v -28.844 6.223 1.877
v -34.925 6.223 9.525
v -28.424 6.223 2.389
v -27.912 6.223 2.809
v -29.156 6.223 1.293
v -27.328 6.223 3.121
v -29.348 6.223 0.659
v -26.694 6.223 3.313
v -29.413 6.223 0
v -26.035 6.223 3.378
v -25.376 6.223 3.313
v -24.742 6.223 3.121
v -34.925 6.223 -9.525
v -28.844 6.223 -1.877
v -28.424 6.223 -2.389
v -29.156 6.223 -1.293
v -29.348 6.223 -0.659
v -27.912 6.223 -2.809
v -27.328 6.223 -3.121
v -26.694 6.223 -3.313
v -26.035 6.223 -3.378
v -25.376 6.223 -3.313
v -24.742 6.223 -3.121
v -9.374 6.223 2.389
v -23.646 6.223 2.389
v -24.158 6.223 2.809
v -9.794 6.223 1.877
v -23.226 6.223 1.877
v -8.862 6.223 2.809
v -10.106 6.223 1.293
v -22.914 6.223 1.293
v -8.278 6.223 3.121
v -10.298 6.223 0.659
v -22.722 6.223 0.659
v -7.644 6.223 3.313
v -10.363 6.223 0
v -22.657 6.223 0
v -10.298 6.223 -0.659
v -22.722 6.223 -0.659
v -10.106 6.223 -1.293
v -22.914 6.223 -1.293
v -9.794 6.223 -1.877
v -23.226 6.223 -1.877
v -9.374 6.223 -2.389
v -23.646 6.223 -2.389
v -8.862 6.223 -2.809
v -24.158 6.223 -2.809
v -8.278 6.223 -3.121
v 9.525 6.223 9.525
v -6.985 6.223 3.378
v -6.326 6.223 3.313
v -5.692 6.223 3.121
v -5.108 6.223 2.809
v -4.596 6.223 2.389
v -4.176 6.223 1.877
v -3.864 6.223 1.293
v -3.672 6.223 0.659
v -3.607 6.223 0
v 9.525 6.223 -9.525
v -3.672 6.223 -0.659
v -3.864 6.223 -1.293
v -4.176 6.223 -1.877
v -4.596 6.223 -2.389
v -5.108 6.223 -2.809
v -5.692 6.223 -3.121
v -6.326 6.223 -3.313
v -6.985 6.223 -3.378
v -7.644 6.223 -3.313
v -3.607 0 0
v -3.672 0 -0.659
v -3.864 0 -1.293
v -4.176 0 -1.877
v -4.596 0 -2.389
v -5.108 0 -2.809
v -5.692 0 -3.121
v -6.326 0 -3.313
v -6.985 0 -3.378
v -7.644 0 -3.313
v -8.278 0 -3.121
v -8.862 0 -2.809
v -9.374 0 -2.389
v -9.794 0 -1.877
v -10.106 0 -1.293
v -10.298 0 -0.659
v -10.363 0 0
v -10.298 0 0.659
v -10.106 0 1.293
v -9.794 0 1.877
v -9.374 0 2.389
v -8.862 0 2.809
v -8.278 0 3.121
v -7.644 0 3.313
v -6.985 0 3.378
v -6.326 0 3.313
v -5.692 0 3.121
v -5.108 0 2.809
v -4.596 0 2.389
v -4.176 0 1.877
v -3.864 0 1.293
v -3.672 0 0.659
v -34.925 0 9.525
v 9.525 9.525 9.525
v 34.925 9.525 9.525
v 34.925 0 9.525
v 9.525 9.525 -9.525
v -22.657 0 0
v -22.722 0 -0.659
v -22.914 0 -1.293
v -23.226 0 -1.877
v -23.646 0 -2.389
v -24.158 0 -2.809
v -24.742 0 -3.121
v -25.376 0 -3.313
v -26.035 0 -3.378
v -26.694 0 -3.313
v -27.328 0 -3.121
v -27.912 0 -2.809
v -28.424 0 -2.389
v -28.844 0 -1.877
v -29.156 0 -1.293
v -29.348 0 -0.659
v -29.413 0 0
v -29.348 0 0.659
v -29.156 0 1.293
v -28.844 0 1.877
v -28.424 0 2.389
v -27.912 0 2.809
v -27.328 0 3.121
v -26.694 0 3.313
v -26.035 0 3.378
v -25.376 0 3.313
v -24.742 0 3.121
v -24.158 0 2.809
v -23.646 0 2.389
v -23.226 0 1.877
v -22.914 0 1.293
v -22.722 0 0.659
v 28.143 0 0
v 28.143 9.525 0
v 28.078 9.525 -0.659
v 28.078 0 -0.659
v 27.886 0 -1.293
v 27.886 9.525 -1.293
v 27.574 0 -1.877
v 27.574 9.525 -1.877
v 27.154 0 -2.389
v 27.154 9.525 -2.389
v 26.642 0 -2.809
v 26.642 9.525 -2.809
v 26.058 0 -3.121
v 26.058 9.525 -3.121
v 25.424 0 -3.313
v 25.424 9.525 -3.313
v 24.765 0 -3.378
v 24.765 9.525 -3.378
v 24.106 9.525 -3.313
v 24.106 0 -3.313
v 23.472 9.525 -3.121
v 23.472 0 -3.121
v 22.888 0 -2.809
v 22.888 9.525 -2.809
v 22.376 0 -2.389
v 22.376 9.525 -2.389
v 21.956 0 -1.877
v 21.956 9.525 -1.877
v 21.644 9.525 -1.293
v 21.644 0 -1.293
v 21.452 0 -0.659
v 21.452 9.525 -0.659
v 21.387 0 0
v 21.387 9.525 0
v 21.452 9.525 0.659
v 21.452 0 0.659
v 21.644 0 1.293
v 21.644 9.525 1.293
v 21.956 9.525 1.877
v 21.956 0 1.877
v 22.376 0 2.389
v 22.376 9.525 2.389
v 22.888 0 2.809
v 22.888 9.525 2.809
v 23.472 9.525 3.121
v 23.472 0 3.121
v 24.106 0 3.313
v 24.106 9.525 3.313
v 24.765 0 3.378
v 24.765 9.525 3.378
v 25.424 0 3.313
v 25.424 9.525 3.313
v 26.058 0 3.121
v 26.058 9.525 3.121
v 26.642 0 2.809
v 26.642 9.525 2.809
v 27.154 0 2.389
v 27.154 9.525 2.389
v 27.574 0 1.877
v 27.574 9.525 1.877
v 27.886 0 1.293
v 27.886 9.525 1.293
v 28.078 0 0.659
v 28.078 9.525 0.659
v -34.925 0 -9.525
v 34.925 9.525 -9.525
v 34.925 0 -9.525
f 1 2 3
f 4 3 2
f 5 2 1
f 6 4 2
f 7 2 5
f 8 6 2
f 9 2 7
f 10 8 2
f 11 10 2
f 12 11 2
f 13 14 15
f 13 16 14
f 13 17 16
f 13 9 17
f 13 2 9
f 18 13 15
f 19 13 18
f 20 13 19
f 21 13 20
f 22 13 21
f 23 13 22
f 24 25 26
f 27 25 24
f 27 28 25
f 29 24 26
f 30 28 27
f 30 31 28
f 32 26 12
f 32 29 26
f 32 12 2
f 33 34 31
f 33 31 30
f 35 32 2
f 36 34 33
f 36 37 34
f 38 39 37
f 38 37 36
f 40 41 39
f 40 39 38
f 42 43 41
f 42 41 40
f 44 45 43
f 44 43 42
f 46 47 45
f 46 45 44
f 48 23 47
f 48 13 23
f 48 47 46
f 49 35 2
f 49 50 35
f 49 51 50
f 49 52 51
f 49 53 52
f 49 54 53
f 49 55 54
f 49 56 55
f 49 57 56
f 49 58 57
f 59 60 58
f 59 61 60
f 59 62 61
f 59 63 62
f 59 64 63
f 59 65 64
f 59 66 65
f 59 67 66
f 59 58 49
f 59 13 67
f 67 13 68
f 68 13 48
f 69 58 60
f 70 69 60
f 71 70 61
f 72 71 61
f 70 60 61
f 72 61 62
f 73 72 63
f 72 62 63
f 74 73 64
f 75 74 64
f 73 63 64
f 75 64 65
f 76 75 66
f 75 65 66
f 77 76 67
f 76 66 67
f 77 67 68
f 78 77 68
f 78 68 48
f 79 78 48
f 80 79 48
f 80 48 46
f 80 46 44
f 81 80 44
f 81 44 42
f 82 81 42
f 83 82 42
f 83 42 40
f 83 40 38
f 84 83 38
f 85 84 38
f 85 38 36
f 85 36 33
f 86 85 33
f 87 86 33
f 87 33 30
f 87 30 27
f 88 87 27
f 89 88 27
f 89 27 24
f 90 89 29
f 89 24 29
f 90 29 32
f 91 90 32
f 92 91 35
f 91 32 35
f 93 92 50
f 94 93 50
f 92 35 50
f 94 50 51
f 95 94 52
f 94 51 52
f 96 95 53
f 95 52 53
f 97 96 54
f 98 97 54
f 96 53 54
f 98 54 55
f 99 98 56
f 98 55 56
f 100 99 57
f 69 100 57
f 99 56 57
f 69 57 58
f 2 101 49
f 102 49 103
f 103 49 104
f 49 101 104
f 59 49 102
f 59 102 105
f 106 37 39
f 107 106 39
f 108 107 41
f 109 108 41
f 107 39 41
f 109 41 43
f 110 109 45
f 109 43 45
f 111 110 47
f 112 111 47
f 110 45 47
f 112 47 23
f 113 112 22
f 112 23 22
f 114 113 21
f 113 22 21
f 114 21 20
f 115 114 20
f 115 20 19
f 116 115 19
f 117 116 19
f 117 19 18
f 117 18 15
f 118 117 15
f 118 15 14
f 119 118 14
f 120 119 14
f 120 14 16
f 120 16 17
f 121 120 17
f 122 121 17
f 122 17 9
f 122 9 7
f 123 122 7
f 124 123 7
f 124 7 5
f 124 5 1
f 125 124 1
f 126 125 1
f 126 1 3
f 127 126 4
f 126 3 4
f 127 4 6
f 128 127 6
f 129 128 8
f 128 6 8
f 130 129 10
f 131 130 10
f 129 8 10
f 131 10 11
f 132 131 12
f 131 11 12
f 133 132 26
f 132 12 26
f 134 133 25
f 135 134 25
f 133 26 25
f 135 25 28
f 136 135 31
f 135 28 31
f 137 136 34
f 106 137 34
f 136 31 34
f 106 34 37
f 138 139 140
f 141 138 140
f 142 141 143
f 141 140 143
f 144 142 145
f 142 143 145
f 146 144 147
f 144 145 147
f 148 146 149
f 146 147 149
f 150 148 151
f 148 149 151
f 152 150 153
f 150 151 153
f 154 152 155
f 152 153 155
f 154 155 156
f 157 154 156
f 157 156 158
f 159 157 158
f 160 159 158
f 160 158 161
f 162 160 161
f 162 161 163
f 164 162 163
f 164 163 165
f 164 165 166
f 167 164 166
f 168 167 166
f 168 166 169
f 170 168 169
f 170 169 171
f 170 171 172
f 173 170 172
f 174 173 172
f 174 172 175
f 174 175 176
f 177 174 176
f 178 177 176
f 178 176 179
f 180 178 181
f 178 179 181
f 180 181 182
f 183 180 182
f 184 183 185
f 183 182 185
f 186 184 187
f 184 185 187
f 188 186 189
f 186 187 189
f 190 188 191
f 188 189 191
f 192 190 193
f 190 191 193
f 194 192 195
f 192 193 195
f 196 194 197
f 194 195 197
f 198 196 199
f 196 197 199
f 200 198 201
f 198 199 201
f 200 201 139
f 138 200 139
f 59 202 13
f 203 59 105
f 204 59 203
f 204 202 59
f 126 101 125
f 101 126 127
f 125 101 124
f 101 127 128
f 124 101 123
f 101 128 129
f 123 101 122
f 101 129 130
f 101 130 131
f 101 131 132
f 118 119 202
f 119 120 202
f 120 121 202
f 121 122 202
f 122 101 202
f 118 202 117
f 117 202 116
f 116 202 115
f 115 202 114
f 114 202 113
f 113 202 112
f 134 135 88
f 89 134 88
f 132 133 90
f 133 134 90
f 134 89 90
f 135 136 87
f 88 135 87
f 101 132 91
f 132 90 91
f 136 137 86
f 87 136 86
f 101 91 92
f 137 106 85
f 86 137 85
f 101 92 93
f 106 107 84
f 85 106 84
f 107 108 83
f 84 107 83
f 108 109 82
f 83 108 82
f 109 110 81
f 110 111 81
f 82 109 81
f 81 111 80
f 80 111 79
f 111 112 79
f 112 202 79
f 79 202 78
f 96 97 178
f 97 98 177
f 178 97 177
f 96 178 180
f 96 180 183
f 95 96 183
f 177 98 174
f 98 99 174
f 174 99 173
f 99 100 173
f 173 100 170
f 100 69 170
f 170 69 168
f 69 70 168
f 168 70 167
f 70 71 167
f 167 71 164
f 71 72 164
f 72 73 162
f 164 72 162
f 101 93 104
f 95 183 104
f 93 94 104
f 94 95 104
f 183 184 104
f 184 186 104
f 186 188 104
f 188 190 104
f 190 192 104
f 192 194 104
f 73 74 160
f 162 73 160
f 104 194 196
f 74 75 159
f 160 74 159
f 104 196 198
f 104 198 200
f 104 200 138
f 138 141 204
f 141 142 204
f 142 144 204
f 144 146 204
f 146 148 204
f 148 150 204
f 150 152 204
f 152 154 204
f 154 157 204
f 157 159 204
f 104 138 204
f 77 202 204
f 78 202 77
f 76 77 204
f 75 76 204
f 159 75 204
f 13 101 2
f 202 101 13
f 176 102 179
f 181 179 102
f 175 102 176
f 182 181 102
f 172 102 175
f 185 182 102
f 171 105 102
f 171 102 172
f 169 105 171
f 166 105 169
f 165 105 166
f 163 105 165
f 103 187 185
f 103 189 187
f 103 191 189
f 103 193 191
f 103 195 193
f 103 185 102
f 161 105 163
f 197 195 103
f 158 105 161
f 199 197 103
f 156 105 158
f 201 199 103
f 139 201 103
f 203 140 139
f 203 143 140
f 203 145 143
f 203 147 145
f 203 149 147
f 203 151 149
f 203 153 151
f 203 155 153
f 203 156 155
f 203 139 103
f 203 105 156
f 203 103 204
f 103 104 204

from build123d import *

# Parameters (mm, degrees)
SKETCH1_W               = 69.85
SKETCH1_H               = 19.05
BOSS_EXTRUDE1_DEPTH     = 6.223
SKETCH4_W               = 25.4
SKETCH4_H               = 19.05
BOSS_EXTRUDE2_DEPTH     = 3.302
F_1_4_CLEARANCE_HOLE2_D = 6.7564


with BuildPart() as part:
    # Sketch1 → Boss-Extrude1 (new body)
    with BuildSketch(Plane(origin=(0, 0, 0), x_dir=(1, 0, 0), z_dir=(0, 1, 0))):
        Rectangle(SKETCH1_W, SKETCH1_H)
    extrude(amount=BOSS_EXTRUDE1_DEPTH)

    # Sketch4 → Boss-Extrude2 (add)
    with BuildSketch(Plane(origin=(0, 6.223, 0), x_dir=(1, 0, 0), z_dir=(0, 1, 0))):
        with Locations((22.225, 0)):
            Rectangle(SKETCH4_W, SKETCH4_H)
    extrude(amount=BOSS_EXTRUDE2_DEPTH)

    # 1/4 Clearance Hole2 (through all)
    with Locations(Plane(origin=(0, 0, 0), x_dir=(-1, 0, 0), z_dir=(0, -1, 0))):
        with Locations((-24.765, 0), (6.985, 0), (26.035, 0)):
            Hole(F_1_4_CLEARANCE_HOLE2_D / 2)


solid = part.part
